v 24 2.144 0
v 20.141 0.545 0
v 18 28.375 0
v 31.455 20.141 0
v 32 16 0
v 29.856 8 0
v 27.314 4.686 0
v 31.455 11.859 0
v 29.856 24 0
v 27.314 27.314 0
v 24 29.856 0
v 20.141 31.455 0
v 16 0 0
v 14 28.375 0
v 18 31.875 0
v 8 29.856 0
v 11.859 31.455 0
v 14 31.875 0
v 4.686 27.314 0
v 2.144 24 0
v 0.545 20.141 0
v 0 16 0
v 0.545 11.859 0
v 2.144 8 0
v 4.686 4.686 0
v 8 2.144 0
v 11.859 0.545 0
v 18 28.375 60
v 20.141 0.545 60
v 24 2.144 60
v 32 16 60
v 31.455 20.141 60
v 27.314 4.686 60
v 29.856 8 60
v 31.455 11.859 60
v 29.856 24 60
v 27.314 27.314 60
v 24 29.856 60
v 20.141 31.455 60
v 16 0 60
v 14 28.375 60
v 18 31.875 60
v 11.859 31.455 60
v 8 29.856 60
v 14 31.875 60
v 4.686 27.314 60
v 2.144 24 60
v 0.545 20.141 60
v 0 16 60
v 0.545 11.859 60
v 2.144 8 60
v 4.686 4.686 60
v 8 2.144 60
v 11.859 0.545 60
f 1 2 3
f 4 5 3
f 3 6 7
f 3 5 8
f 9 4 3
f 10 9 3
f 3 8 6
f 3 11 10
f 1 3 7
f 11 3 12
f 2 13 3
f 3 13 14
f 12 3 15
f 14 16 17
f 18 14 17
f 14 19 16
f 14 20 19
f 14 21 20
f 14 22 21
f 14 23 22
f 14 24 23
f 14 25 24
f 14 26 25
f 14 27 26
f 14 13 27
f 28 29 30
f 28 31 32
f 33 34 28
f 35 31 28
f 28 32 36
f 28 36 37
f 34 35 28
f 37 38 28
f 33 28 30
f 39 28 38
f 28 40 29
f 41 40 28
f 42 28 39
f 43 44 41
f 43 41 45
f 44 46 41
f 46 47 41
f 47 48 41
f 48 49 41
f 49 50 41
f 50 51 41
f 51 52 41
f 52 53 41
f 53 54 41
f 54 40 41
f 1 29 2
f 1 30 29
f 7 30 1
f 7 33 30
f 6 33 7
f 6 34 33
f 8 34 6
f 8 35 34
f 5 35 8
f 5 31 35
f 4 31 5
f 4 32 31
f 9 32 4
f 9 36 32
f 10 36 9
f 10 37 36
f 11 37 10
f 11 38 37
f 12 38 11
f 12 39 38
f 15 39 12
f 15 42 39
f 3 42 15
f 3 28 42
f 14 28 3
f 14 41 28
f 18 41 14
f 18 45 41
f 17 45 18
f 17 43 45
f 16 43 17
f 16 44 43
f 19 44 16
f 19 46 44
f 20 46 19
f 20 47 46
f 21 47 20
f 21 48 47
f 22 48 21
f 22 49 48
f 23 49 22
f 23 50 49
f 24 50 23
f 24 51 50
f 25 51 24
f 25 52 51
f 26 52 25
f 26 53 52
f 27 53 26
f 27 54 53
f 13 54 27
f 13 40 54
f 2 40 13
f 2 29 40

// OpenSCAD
$fn = 32;

// ----------------------------------------------------------------------
// Keyway shaft: d32 shaft, key 4 x 3.5 mm
// ----------------------------------------------------------------------

// --- parameters (mm) ---
shaft_r = 16;             // shaft radius
key_w = 4;                // keyway width
key_d = 3.5;              // keyway depth below the surface line
plate_t = 60;             // shaft length, Z (extrusion height)

shaft_d = 2 * shaft_r;  // shaft diameter
circle_step = 15;  // polygon sampling step, degrees

profile = [[11.859, 31.455], [8, 29.856], [4.686, 27.314], [2.144, 24], [0.545, 20.141], [0, 16], [0.545, 11.859], [2.144, 8], [4.686, 4.686], [8, 2.144], [11.859, 0.545], [16, 0], [20.141, 0.545], [24, 2.144], [27.314, 4.686], [29.856, 8], [31.455, 11.859], [32, 16], [31.455, 20.141], [29.856, 24], [27.314, 27.314], [24, 29.856], [20.141, 31.455], [18, 31.875], [18, 28.375], [14, 28.375], [14, 31.875]];  // primary outline, 27 points, counter clockwise

// --- the one profile operation ---
linear_extrude(height = plate_t) polygon(points = profile);
